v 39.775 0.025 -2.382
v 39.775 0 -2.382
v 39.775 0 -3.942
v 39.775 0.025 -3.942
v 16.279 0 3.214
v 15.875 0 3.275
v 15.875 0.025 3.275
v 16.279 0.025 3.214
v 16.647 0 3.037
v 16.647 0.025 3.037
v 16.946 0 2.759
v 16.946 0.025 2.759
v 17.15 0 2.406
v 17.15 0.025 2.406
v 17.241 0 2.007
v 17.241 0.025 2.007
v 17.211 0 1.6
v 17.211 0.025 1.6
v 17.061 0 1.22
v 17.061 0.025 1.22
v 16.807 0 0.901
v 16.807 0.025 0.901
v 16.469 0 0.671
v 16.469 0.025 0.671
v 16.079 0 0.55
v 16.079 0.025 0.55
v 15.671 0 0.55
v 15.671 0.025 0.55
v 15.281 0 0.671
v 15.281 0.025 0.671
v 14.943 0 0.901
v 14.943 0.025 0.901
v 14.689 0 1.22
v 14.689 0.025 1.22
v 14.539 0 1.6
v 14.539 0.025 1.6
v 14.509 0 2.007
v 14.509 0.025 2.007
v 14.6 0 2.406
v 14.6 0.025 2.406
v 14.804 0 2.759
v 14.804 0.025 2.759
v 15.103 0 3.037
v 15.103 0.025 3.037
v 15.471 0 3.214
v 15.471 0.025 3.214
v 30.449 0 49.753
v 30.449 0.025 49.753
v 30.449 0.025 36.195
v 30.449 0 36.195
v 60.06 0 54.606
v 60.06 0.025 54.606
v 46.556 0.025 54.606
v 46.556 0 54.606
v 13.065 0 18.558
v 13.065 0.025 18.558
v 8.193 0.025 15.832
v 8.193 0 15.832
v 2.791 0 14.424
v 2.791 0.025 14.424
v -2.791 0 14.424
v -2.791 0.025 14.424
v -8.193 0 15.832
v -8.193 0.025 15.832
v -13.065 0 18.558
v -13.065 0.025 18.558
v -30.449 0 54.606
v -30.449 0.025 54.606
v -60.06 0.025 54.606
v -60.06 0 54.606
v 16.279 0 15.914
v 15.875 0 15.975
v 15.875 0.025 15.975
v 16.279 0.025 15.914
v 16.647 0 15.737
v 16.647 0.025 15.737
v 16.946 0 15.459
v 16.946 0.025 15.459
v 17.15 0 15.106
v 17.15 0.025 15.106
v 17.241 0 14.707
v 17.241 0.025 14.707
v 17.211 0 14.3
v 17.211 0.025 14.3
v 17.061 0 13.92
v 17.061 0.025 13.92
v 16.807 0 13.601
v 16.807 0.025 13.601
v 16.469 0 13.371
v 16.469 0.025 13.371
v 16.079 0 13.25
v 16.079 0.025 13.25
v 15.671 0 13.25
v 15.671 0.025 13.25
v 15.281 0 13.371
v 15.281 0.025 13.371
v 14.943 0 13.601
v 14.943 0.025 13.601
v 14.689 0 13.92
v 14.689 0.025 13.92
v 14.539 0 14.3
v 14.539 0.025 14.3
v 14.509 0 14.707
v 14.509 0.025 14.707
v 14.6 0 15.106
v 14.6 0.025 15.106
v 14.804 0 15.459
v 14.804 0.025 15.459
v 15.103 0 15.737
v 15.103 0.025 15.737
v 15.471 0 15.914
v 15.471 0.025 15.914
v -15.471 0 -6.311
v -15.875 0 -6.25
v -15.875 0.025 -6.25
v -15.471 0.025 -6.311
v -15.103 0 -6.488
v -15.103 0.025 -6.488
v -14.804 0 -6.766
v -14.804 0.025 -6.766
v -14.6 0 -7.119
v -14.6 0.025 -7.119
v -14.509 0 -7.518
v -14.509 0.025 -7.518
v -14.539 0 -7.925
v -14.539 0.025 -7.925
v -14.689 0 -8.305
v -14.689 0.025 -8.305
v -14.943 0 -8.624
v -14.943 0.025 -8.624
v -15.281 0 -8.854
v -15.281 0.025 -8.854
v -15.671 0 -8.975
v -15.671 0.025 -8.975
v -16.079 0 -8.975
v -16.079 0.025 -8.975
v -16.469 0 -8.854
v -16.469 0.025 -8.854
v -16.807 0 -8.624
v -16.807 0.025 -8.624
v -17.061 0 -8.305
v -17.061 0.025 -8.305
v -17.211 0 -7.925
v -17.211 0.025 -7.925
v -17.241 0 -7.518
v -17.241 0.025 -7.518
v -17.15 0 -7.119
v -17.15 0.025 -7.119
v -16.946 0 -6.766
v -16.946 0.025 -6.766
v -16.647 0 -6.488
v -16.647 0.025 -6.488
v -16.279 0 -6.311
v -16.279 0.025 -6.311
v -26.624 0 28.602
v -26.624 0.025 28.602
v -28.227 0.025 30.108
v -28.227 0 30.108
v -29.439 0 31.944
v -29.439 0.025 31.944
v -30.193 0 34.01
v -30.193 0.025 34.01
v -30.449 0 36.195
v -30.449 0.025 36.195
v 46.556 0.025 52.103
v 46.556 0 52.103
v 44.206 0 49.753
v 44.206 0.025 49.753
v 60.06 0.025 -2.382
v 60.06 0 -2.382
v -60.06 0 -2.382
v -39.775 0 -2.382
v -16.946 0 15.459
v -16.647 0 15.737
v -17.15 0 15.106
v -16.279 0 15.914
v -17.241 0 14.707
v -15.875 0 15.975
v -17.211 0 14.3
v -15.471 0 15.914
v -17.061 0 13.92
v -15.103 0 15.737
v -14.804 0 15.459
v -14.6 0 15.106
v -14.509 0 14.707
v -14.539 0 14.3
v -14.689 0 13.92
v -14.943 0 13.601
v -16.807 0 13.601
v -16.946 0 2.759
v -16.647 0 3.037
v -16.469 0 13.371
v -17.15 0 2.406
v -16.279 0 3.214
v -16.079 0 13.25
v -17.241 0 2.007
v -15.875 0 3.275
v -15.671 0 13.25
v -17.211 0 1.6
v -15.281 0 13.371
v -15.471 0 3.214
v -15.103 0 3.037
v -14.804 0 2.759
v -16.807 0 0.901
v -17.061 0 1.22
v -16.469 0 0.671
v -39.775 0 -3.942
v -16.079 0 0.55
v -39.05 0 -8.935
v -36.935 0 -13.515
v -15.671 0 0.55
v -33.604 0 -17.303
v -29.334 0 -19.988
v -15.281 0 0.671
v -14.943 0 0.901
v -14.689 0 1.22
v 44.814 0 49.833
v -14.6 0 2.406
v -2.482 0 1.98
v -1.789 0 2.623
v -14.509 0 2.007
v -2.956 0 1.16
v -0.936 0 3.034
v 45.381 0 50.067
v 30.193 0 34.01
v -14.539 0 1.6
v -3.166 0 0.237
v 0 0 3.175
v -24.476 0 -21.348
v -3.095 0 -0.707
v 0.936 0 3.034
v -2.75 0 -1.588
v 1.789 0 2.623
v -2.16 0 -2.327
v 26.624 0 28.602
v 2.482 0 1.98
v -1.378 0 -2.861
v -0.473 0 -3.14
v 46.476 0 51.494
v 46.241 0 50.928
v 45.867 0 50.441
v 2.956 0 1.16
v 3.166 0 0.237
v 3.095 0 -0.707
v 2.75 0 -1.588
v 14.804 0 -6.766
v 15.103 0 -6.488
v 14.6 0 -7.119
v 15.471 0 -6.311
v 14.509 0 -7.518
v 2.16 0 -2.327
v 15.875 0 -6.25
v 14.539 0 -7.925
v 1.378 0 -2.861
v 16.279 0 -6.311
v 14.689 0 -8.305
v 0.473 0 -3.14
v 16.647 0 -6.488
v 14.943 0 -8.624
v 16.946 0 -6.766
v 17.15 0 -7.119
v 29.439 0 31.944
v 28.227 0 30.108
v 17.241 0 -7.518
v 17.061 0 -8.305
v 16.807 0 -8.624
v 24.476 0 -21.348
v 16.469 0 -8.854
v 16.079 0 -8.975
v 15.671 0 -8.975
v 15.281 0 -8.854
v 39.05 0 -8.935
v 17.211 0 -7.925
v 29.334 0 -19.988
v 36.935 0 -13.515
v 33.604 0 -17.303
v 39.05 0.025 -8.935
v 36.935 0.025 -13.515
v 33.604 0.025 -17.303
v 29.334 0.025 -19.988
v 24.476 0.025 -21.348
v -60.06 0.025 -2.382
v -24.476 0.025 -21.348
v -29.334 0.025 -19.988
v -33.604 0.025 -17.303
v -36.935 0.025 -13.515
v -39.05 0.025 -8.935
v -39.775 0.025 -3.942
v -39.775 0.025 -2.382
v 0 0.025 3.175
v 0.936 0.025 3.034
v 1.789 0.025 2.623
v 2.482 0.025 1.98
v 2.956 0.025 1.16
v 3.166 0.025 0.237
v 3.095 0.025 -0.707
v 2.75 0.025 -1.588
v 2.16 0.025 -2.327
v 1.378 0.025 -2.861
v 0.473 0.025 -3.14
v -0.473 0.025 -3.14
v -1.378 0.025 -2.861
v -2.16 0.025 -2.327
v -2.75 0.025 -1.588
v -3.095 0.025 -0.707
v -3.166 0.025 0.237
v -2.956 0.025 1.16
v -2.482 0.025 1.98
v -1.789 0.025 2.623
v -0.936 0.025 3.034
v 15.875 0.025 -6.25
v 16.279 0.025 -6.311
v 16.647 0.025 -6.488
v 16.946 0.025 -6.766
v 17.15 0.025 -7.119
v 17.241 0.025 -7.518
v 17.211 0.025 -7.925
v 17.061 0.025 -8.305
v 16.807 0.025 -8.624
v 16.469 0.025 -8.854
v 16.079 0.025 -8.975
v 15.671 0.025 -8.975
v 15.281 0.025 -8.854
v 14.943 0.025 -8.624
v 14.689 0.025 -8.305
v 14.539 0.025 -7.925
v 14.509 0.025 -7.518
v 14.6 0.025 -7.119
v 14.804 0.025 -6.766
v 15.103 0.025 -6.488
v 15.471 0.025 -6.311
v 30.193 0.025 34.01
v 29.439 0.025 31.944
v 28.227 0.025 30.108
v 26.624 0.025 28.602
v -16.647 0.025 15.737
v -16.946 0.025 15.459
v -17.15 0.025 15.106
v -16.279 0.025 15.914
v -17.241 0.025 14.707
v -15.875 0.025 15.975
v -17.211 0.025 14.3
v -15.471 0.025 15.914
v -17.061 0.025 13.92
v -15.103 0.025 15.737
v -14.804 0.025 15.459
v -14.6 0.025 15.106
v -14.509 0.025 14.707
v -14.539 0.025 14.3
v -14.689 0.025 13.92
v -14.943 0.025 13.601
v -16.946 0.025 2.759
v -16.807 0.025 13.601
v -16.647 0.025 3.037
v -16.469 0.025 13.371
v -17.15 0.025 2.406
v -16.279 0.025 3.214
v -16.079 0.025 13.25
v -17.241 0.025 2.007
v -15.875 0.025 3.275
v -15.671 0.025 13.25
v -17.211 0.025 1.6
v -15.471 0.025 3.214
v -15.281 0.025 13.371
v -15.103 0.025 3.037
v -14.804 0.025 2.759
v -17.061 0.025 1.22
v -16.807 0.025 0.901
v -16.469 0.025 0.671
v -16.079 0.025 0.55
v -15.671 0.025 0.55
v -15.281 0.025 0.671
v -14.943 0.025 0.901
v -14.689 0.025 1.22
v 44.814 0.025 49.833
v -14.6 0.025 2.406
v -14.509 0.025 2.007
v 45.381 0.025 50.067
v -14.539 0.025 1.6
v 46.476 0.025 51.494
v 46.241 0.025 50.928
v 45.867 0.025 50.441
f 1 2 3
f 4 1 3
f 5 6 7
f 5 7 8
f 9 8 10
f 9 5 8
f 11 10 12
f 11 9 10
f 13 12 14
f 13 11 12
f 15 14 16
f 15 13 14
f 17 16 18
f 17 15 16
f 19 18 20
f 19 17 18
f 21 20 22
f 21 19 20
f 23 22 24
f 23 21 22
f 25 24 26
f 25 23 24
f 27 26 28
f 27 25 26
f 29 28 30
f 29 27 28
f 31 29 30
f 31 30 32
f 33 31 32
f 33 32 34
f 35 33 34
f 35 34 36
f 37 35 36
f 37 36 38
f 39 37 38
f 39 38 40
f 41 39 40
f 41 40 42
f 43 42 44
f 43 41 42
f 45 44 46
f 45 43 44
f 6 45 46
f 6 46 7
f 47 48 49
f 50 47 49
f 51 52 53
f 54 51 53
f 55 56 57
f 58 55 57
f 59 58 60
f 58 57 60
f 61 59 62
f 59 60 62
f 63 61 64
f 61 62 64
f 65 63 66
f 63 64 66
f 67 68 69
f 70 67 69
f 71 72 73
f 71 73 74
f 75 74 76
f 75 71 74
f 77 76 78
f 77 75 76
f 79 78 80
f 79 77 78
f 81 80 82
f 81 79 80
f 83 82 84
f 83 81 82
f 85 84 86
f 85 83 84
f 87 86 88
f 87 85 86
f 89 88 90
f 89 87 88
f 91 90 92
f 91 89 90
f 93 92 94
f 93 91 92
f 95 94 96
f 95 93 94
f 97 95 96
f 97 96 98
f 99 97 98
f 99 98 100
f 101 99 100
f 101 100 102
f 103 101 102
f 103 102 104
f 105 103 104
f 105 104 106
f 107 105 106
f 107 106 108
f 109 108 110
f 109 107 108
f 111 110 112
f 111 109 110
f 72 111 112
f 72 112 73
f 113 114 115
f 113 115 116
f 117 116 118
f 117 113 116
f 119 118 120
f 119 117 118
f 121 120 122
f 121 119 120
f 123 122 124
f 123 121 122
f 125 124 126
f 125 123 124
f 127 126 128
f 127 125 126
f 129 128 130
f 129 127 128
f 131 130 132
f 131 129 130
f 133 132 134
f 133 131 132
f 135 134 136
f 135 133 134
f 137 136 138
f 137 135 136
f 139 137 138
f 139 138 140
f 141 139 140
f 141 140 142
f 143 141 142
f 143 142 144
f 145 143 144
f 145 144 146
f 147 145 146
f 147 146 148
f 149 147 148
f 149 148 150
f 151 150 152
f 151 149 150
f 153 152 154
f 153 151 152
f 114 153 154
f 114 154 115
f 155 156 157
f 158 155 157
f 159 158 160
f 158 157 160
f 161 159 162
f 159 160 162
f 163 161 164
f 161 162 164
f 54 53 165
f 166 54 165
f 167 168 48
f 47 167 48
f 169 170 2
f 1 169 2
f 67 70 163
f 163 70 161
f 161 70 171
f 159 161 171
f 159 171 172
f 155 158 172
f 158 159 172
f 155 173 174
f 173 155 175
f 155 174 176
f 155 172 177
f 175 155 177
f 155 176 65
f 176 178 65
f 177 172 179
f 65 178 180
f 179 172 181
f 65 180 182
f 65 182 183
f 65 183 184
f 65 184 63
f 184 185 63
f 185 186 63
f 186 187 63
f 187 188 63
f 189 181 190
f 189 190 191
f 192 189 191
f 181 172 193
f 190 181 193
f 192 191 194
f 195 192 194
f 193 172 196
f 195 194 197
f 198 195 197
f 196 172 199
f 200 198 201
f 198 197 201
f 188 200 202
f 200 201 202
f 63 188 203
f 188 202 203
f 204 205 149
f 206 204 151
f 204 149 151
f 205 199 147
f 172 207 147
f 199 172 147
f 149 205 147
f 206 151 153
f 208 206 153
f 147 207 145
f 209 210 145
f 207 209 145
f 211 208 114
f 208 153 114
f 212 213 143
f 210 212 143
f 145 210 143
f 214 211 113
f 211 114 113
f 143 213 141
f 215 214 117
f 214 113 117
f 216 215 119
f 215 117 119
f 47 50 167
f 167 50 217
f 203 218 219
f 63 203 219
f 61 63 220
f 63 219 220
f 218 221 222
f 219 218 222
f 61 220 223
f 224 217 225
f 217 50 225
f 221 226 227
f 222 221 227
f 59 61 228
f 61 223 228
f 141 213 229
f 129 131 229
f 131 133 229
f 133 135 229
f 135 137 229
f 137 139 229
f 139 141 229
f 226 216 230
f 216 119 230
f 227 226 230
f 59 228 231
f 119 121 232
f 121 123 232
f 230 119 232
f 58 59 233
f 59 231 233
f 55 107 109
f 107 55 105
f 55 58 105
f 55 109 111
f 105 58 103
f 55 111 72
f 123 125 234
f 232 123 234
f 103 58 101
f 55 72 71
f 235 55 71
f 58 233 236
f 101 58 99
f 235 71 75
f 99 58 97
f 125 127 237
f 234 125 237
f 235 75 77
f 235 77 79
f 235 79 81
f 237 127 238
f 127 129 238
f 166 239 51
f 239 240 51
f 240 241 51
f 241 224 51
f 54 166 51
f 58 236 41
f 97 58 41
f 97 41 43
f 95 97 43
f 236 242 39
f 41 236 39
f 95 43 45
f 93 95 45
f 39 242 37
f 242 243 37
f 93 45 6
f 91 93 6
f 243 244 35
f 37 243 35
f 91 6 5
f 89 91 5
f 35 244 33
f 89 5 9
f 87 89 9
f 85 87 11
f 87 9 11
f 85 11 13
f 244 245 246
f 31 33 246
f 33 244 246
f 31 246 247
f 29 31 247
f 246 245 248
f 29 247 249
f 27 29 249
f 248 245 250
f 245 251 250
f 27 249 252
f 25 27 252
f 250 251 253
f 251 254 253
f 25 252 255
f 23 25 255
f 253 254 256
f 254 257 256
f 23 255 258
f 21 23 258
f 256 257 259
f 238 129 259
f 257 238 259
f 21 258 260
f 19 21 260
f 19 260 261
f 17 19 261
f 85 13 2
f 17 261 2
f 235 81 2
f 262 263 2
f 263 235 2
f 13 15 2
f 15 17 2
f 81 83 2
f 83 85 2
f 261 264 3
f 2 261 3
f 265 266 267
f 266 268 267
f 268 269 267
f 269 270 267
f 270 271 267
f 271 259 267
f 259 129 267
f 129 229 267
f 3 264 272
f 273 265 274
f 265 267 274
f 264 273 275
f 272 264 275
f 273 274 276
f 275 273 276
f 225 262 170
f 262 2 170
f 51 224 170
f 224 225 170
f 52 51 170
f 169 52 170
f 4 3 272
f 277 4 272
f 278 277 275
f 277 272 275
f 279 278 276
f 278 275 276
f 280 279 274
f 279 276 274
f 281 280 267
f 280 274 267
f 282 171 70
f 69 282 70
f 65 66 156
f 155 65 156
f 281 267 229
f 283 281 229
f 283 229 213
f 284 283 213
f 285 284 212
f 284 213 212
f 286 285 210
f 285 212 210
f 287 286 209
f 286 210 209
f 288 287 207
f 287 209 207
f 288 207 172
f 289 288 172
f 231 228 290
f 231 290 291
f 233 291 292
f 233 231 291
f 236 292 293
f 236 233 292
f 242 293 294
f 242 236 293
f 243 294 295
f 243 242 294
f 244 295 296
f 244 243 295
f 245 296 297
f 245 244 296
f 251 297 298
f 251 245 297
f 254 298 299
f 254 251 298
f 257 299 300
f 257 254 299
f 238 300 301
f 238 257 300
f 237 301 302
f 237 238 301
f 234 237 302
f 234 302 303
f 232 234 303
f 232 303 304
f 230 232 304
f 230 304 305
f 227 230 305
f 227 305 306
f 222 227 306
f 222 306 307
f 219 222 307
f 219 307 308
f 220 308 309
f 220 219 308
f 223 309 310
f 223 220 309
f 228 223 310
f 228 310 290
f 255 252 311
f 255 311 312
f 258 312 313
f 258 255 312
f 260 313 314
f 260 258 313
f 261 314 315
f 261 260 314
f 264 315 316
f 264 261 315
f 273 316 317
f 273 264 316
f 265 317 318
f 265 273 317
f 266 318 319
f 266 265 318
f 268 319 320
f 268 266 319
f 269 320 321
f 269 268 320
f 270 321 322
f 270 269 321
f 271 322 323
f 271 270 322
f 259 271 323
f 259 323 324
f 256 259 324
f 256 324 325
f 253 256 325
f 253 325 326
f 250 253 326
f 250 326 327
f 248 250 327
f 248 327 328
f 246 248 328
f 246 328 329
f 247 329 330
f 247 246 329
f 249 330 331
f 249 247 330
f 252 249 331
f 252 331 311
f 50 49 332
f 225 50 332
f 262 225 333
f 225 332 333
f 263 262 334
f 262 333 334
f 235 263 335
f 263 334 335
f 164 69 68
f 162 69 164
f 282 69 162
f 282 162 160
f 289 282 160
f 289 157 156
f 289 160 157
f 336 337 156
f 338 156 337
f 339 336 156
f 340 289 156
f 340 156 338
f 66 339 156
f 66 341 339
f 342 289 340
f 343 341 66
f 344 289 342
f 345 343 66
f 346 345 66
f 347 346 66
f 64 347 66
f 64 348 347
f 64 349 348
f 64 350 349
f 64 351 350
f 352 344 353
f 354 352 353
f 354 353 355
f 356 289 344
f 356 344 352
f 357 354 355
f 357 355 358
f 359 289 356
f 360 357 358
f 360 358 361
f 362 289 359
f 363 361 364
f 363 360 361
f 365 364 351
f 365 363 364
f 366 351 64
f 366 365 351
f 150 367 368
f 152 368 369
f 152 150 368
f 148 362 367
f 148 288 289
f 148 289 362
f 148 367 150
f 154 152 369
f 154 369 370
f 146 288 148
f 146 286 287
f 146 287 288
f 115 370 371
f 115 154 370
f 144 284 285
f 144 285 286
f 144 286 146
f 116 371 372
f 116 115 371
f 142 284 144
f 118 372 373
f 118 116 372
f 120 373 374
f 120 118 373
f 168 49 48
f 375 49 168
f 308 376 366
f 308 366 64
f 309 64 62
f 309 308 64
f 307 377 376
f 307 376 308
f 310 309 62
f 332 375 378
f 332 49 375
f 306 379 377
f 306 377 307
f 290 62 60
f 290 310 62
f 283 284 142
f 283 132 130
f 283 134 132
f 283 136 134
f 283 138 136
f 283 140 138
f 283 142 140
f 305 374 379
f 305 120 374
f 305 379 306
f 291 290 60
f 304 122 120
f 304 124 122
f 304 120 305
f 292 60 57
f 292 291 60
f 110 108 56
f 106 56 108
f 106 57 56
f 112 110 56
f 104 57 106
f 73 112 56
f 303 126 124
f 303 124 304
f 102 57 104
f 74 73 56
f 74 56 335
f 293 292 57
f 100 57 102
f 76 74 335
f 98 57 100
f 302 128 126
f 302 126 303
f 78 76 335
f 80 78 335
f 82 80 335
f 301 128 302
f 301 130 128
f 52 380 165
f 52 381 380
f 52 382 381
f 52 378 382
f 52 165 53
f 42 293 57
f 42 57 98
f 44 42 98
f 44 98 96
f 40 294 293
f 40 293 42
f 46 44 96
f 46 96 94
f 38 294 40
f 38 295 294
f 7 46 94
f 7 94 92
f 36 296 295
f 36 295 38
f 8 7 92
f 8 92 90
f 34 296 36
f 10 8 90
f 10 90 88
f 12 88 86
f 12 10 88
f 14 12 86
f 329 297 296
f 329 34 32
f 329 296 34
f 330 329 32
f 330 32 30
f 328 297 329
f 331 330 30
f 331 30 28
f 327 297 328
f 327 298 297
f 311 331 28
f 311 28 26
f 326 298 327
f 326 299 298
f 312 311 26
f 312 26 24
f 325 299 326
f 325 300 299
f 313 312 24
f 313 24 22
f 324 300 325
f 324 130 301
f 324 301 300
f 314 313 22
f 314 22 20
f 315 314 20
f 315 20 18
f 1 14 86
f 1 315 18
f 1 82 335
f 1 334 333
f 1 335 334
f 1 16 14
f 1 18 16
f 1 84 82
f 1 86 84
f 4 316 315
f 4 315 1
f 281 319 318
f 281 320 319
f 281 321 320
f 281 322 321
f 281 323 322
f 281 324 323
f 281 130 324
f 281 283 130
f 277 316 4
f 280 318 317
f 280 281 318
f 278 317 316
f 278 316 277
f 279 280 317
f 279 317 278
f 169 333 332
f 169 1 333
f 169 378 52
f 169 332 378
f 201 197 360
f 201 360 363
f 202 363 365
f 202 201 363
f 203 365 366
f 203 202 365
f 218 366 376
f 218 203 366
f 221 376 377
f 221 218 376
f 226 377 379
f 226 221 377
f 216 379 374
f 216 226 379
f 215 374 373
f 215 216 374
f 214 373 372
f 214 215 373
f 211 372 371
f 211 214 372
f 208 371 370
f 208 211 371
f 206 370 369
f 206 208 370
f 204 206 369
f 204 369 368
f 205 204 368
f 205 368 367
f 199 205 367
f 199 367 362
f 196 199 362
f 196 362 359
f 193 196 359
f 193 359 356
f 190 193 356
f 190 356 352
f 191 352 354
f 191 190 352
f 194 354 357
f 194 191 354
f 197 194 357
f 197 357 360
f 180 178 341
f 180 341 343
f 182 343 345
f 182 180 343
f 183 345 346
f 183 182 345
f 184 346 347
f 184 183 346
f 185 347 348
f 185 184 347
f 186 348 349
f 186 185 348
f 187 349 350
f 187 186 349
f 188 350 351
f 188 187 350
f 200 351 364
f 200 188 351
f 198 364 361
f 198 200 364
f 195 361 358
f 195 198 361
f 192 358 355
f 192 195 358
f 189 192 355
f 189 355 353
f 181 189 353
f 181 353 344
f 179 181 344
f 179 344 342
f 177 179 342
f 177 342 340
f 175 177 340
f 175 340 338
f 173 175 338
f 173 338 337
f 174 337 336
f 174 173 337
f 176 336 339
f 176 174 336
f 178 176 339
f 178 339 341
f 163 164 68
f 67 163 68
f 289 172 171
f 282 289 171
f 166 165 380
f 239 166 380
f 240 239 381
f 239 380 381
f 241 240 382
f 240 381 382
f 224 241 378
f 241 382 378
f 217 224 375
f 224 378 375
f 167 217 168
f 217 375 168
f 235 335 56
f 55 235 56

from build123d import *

# Parameters (mm, degrees)
SKETCH1_R           = 1.37
SKETCH1_R_2         = 3.175
BOSS_EXTRUDE1_DEPTH = 0.0254
CUT_EXTRUDE1_DEPTH  = 1.0254


with BuildPart() as part:
    # Sketch1 → Boss-Extrude1 (new body)
    with BuildSketch(Plane(origin=(0, 0, 0), x_dir=(1, 0, 0), z_dir=(0, 1, 0))):
        with BuildLine():
            Line((46.055581216, -52.102523804), (46.055581216, -55.105805187))
            Line((46.055581216, -55.105805187), (60.06, -55.105805187))
            Line((60.06, -55.105805187), (60.06, 2.3825))
            Line((60.06, 2.3825), (39.775, 2.3825))
            Line((39.775, 2.3825), (39.775, 3.9425))
            ThreePointArc((39.775, 3.9425), (35.406414292, 15.5292518), (24.475533644, 21.347602652))
            Line((24.475533644, 21.347602652), (-24.475533644, 21.347602652))
            ThreePointArc((-24.475533644, 21.347602652), (-35.406414292, 15.5292518), (-39.775, 3.9425))
            Line((-39.775, 3.9425), (-39.775, 2.3825))
            Line((-39.775, 2.3825), (-60.06, 2.3825))
            Line((-60.06, 2.3825), (-60.06, -55.105805187))
            Line((-60.06, -55.105805187), (-29.948964567, -55.105805187))
            Line((-29.948964567, -55.105805187), (-29.948964567, -36.195))
            ThreePointArc((-29.948964567, -36.195), (-28.992277356, -32.169149844), (-26.326764623, -29.004065049))
            Line((-26.326764623, -29.004065049), (-12.767240814, -18.959697769))
            ThreePointArc((-12.767240814, -18.959697769), (0, -14.746035433), (12.767240814, -18.959697769))
            Line((12.767240814, -18.959697769), (26.326764623, -29.004065049))
            ThreePointArc((26.326764623, -29.004065049), (28.992277356, -32.169149844), (29.948964567, -36.195))
            Line((29.948964567, -36.195), (29.948964567, -50.252557813))
            Line((29.948964567, -50.252557813), (44.205615226, -50.252557813))
            ThreePointArc((44.205615226, -50.252557813), (45.513738722, -50.794400307), (46.055581216, -52.102523804))
        make_face()
        with Locations(Location((-15.875, -1.905, 0), (0, 0, 270))):  # turned: the seam where the file's is
            Circle(SKETCH1_R, mode=Mode.SUBTRACT)
        with Locations(Location((-15.875, 7.62, 0), (0, 0, 270))):  # turned: the seam where the file's is
            Circle(SKETCH1_R, mode=Mode.SUBTRACT)
        with Locations(Location((-15.875, -14.605, 0), (0, 0, 270))):  # turned: the seam where the file's is
            Circle(SKETCH1_R, mode=Mode.SUBTRACT)
        with Locations(Location((0, 0, 0), (0, 0, 270))):  # turned: the seam where the file's is
            Circle(SKETCH1_R_2, mode=Mode.SUBTRACT)
        with Locations(Location((15.875, -1.905, 0), (0, 0, 270))):  # turned: the seam where the file's is
            Circle(SKETCH1_R, mode=Mode.SUBTRACT)
        with Locations(Location((15.875, 7.62, 0), (0, 0, 270))):  # turned: the seam where the file's is
            Circle(SKETCH1_R, mode=Mode.SUBTRACT)
        with Locations(Location((15.875, -14.605, 0), (0, 0, 270))):  # turned: the seam where the file's is
            Circle(SKETCH1_R, mode=Mode.SUBTRACT)
    extrude(amount=BOSS_EXTRUDE1_DEPTH)

    # Sketch2 → Cut-Extrude1 (cut, through all)
    with BuildSketch(Plane(origin=(0, 0.0254, 0), x_dir=(1, 0, 0), z_dir=(0, 1, 0))):
        with BuildLine():
            Line((-60.06, -55.105805187), (-29.948964567, -55.105805187))
            Line((-29.948964567, -55.105805187), (-29.948964567, -36.195))
            ThreePointArc((-29.948964567, -36.195), (-28.992277356, -32.169149844), (-26.326764623, -29.004065049))
            Line((-26.326764623, -29.004065049), (-12.767240814, -18.959697769))
            ThreePointArc((-12.767240814, -18.959697769), (0, -14.746035433), (12.767240814, -18.959697769))
            Line((12.767240814, -18.959697769), (26.326764623, -29.004065049))
            ThreePointArc((26.326764623, -29.004065049), (28.992277356, -32.169149844), (29.948964567, -36.195))
            Line((29.948964567, -36.195), (29.948964567, -50.252557813))
            Line((29.948964567, -50.252557813), (44.205615226, -50.252557813))
            ThreePointArc((44.205615226, -50.252557813), (45.513738722, -50.794400307), (46.055581216, -52.102523804))
            Line((46.055581216, -52.102523804), (46.055581216, -55.105805187))
            Line((46.055581216, -55.105805187), (60.06, -55.105805187))
            Line((60.06, -55.105805187), (60.06, -54.605805187))
            Line((60.06, -54.605805187), (46.555581216, -54.605805187))
            Line((46.555581216, -54.605805187), (46.555581216, -52.102523804))
            ThreePointArc((46.555581216, -52.102523804), (45.867292113, -50.440846916), (44.205615226, -49.752557813))
            Line((44.205615226, -49.752557813), (30.448964567, -49.752557813))
            Line((30.448964567, -49.752557813), (30.448964567, -36.195))
            ThreePointArc((30.448964567, -36.195), (29.43882496, -31.944215992), (26.624383671, -28.602290358))
            Line((26.624383671, -28.602290358), (13.064859861, -18.557923078))
            ThreePointArc((13.064859861, -18.557923078), (0, -14.246035433), (-13.064859861, -18.557923078))
            Line((-13.064859861, -18.557923078), (-26.624383671, -28.602290358))
            ThreePointArc((-26.624383671, -28.602290358), (-29.43882496, -31.944215992), (-30.448964567, -36.195))
            Line((-30.448964567, -36.195), (-30.448964567, -54.605805187))
            Line((-30.448964567, -54.605805187), (-60.06, -54.605805187))
            Line((-60.06, -54.605805187), (-60.06, -55.105805187))
        make_face()
    extrude(amount=-CUT_EXTRUDE1_DEPTH, mode=Mode.SUBTRACT)


solid = part.part
